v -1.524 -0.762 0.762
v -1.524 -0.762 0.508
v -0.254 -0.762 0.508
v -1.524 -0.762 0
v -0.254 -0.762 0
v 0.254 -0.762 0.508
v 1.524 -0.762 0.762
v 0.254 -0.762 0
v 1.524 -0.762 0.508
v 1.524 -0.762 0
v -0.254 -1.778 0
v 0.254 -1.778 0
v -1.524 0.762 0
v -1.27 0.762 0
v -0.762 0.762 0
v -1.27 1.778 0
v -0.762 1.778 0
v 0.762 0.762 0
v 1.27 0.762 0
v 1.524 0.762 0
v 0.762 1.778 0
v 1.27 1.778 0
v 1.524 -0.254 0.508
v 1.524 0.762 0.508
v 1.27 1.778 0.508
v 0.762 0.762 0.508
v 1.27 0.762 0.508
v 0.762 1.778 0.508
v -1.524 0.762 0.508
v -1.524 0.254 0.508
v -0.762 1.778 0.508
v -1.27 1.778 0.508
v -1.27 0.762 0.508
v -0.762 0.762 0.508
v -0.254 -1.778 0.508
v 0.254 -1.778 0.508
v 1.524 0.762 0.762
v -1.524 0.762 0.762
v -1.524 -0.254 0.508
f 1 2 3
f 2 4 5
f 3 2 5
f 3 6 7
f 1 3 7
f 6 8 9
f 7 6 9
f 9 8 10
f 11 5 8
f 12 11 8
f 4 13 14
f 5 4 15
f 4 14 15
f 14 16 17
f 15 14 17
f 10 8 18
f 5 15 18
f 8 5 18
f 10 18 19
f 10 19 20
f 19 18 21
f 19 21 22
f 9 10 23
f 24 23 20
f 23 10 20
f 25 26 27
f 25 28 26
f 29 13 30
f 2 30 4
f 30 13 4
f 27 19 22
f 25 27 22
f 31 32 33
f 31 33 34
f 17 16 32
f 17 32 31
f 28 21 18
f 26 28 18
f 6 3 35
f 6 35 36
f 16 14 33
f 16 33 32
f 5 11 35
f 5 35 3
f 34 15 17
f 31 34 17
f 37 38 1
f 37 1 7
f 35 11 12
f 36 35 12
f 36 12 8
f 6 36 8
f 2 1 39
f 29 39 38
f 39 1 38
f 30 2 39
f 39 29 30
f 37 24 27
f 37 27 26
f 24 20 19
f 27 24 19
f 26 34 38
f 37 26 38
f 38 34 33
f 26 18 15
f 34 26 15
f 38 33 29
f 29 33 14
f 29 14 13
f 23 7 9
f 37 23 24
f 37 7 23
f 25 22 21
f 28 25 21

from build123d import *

# Parameters (mm, degrees)
F0_W     = 0.508
F0_H     = 1.016
F1_DEPTH = 0.762
F2_W     = 5.1749609411
F2_H     = 4.1793081909
F2_W_2   = 3.0479989649
F2_H_2   = 1.524
F3_DEPTH = 0.254


# Not quite as in the source:
# - ends of sketch curves that miss each other by under 0.0002 mm in the source are joined


with BuildPart() as f1:
    # F0 (on Top) → F1 (new body)
    with BuildSketch(Plane.XY):
        Polygon((-1.27, 0.762), (-1.524, 0.762), (-1.524, -0.762), (-0.254, -0.762), (0.254, -0.762), (1.524, -0.762), (1.524, 0.762), (1.27, 0.762), (0.762, 0.762), (-0.762, 0.762), align=None)
        with Locations((-1.016, 1.27)):
            Rectangle(F0_W, F0_H)
        with Locations((0, -1.27)):
            Rectangle(F0_W, F0_H)
        Polygon((0.762, 1.7779941872), (0.762, 0.7619941872), (1.27, 0.762), (1.27, 1.7779941872), align=None)
    extrude(amount=F1_DEPTH)

    # F2 (on face) → F3 (cut)
    with BuildSketch(Plane.XY.offset(0.762)):
        Rectangle(F2_W, F2_H)
        Rectangle(F2_W_2, F2_H_2, mode=Mode.SUBTRACT)
    extrude(amount=-F3_DEPTH, mode=Mode.SUBTRACT)


solid = f1.part
